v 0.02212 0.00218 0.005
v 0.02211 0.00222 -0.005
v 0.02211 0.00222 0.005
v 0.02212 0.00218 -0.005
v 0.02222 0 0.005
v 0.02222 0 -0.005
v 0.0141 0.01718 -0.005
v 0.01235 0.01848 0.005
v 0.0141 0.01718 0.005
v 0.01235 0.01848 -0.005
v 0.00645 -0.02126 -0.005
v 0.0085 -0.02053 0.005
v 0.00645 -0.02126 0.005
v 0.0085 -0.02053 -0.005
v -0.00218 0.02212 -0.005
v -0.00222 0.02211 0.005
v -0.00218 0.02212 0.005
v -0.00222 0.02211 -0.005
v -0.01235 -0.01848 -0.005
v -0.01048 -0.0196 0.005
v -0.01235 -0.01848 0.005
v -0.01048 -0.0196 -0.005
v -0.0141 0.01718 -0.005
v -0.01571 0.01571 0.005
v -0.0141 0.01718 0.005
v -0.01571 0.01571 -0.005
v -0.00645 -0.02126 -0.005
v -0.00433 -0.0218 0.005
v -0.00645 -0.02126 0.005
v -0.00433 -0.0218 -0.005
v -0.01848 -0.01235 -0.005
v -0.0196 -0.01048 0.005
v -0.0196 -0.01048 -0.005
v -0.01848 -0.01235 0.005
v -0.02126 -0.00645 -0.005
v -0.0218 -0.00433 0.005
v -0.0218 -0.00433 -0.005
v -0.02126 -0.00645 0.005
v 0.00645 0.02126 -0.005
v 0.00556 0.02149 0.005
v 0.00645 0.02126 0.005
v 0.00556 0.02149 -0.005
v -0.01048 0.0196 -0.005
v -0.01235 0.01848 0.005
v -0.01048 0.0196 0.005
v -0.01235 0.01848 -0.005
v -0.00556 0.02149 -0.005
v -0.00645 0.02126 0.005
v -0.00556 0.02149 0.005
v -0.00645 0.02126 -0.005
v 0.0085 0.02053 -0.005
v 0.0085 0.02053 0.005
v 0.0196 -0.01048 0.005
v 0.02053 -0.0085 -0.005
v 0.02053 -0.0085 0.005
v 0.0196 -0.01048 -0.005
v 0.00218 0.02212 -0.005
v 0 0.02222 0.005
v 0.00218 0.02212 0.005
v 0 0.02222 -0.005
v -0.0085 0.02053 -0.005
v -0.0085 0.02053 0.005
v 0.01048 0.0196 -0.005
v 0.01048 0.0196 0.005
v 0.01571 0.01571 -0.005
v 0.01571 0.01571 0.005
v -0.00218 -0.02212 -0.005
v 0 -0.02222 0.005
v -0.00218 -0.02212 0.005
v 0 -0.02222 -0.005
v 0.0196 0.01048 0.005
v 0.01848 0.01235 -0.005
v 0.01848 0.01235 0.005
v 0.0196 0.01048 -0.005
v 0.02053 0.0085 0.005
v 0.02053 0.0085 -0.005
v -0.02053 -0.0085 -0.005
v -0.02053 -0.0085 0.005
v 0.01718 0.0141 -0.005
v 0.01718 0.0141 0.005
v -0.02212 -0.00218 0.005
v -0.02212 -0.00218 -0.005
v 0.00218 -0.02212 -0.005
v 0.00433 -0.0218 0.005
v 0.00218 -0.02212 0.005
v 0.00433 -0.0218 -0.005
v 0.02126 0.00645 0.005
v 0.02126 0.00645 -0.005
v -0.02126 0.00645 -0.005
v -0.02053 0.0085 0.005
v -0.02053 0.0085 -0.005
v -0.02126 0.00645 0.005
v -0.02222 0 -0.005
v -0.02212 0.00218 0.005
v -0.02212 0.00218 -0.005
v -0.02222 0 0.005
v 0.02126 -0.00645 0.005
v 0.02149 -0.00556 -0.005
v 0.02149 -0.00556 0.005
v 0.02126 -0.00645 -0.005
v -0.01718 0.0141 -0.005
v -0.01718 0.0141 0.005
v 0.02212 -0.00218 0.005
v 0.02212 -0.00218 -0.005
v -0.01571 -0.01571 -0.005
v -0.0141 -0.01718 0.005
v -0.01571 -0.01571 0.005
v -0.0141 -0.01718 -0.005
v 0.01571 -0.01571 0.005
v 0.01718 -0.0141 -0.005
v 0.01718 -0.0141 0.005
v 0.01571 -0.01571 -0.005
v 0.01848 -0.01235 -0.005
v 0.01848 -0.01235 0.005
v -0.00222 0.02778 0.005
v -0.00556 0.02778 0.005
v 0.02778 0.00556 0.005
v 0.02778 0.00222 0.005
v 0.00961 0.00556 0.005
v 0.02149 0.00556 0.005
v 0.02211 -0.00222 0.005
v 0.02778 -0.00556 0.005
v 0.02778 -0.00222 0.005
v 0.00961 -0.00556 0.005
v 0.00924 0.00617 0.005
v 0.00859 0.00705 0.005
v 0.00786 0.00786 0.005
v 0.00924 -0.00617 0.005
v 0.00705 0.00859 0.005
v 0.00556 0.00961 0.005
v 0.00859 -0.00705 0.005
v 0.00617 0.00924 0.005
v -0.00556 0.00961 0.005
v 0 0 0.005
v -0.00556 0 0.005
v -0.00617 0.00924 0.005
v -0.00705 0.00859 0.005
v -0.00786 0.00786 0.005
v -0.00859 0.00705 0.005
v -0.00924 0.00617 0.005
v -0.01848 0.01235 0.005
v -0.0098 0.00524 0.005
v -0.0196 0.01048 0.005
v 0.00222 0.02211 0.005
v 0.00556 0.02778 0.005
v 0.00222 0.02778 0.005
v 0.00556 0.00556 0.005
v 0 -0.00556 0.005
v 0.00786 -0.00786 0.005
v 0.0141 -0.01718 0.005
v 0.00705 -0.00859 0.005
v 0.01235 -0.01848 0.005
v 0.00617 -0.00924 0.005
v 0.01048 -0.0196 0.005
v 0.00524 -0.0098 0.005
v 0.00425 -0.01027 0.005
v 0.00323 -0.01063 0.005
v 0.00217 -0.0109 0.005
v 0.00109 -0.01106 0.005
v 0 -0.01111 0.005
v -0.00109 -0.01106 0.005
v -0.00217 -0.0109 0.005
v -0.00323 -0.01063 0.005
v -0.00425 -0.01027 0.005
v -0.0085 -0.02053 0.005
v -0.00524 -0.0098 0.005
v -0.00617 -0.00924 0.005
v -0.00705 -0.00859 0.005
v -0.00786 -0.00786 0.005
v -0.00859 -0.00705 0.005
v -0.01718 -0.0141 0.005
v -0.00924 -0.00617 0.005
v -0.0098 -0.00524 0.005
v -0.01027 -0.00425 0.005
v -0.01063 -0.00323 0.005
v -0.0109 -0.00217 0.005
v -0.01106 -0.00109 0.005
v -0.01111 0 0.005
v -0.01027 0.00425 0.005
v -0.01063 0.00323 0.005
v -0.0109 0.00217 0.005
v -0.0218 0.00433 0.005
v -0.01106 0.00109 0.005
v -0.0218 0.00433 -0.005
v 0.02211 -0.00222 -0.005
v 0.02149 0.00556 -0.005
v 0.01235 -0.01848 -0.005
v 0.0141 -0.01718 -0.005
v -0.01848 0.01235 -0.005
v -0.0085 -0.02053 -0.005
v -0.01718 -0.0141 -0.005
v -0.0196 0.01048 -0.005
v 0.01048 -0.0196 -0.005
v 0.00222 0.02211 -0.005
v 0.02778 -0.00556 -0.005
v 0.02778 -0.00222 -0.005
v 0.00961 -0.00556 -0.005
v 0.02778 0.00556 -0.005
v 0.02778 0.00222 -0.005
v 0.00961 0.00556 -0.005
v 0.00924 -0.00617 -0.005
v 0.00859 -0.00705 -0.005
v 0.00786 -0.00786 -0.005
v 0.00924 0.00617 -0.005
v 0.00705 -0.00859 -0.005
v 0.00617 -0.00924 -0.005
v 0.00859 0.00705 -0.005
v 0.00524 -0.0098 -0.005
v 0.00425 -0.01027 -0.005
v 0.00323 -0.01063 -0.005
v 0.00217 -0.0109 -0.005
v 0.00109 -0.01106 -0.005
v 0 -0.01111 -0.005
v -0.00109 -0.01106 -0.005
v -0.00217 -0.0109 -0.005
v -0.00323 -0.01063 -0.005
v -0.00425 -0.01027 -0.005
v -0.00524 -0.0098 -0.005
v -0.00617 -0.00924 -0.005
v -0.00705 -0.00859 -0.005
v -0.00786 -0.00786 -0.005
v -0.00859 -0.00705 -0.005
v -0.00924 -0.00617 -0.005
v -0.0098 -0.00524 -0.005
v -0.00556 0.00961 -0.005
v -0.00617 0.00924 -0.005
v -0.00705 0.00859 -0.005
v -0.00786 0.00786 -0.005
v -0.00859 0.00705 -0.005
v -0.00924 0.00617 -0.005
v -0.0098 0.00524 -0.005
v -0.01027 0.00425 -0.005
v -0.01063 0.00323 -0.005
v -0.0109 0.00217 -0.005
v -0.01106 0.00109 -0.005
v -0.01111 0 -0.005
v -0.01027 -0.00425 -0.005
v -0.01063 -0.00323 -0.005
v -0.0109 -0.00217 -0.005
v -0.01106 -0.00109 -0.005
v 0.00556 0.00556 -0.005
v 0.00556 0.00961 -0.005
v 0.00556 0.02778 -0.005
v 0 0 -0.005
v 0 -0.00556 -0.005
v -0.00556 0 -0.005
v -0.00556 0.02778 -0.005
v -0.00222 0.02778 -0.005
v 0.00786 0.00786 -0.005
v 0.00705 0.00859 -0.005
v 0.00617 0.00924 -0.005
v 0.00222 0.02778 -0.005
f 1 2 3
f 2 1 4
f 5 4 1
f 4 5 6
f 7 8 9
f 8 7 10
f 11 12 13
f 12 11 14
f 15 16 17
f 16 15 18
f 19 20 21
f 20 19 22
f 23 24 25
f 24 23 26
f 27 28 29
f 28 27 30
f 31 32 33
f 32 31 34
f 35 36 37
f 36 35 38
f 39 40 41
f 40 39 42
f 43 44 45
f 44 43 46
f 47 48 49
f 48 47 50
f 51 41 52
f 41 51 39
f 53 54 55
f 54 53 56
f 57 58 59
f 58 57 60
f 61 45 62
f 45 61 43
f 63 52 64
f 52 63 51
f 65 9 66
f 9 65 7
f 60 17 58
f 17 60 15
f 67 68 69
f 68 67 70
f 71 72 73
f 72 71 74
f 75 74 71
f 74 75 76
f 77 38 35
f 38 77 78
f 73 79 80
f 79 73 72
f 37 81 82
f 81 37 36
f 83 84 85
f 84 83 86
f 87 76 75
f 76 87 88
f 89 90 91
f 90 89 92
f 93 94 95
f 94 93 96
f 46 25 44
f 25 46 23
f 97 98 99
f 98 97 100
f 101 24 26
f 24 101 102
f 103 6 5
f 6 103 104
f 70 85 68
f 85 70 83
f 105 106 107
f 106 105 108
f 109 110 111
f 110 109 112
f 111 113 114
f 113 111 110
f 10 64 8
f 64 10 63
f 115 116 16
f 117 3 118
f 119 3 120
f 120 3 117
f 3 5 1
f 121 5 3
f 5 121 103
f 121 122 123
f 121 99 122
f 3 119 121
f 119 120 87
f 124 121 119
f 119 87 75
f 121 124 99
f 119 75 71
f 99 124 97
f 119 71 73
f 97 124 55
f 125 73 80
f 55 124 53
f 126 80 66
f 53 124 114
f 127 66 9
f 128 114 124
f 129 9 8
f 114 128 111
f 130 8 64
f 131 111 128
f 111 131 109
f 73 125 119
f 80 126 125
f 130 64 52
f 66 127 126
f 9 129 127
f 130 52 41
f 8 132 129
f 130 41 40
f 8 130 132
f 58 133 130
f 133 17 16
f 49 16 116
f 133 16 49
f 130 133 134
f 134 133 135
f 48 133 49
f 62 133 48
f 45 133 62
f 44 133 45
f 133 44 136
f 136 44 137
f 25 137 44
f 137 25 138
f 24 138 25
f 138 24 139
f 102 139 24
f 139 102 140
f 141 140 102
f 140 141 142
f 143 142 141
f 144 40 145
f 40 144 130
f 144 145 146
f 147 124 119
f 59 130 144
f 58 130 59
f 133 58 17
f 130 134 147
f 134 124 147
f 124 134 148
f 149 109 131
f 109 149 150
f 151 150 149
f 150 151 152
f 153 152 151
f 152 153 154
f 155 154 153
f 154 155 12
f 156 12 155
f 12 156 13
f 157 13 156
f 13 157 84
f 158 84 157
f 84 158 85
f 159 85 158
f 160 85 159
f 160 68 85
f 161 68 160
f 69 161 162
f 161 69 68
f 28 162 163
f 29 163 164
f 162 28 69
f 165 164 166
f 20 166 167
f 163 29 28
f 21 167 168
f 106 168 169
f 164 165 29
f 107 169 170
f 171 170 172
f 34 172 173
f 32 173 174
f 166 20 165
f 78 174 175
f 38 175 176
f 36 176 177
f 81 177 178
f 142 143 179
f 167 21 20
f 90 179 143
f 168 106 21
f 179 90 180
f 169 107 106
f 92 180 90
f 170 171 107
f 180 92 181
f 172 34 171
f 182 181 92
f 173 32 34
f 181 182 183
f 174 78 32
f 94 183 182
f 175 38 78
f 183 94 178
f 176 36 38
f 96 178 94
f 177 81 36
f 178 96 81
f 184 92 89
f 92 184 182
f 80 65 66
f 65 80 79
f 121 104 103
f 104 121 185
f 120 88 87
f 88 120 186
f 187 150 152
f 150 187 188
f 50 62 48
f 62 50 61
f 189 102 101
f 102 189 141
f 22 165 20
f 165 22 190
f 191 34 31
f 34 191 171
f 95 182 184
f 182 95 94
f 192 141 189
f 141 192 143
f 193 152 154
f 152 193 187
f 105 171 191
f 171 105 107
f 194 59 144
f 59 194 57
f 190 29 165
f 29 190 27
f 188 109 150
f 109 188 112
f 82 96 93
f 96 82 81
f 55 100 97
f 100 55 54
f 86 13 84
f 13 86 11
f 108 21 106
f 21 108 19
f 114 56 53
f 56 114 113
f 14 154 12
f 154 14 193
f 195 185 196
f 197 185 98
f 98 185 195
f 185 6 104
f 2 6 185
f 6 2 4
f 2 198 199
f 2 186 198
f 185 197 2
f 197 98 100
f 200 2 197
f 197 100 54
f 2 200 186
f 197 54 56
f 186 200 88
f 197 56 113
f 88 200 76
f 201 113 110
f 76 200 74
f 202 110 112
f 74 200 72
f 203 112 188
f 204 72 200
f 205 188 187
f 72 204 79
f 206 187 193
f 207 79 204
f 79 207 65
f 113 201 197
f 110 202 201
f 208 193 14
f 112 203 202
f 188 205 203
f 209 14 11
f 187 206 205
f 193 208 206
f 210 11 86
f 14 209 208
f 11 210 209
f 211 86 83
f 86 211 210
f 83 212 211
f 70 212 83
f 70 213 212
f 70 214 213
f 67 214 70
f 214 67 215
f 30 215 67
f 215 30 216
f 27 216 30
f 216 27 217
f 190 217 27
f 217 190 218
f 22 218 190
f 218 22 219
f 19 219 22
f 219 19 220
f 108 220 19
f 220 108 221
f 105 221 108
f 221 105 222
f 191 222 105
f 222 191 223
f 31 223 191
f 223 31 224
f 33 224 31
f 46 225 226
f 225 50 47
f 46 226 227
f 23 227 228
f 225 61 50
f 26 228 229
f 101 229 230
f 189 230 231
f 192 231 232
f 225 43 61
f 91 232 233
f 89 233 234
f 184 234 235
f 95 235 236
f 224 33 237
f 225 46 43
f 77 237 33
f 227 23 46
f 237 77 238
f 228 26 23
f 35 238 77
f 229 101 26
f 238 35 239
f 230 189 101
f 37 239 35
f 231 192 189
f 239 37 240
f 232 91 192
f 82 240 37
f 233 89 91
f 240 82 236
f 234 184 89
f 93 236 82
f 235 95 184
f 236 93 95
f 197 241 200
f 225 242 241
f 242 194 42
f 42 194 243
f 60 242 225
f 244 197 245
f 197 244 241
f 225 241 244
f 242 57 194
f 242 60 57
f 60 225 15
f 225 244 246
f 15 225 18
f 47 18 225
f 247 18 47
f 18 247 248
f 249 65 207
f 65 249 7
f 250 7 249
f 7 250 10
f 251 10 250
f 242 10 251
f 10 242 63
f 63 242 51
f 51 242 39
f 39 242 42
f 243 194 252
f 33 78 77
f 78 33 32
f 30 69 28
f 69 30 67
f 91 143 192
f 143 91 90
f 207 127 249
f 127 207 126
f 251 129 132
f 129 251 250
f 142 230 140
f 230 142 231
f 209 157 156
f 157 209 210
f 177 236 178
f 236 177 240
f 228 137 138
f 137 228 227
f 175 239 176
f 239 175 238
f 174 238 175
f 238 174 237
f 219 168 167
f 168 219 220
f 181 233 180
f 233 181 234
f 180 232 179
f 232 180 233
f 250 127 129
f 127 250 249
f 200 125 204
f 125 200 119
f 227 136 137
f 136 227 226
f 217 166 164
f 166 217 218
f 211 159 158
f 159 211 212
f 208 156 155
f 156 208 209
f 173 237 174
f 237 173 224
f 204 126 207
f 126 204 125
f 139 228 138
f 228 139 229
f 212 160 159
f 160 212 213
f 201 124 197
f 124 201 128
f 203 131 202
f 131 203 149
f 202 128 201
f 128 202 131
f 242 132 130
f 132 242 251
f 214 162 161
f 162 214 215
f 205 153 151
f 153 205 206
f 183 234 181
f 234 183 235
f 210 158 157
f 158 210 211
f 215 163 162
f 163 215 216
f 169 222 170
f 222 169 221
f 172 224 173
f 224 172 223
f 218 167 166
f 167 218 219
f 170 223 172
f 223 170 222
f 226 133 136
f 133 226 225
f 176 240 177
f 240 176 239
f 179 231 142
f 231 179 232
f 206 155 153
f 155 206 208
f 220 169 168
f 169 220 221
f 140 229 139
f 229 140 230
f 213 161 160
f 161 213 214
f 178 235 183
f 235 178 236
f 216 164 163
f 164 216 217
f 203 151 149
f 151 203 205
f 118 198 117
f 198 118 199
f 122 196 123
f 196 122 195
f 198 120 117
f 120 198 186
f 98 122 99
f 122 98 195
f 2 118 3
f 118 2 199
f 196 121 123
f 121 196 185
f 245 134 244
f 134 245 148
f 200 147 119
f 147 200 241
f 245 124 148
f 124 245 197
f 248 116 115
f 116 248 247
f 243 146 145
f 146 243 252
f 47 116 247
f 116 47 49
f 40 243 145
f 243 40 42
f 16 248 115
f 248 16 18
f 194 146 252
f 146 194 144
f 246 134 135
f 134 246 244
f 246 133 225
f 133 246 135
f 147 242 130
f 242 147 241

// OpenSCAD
$fn=64;

bbox_x = 0.1;
bbox_y = 0.1;
bbox_z = 0.01;

ring_od = 0.08;
ring_id = 0.04;
plate_t = bbox_z;

arm_len = 0.03;
arm_w  = 0.02;

clevis_len = 0.02;
clevis_w   = 0.02;
prong_w    = 0.006;
gap_w      = clevis_w - 2*prong_w;
u_depth    = 0.012;

module annulus(od, id, t){
    difference(){
        cylinder(d=od, h=t, center=true);
        cylinder(d=id, h=t+0.02, center=true);
    }
}

module arm_plate(len, w, t){
    translate([len/2,0,0]) cube([len,w,t], center=true);
}

module clevis_u_end(len, w, t, prong, udepth){
    difference(){
        translate([len/2,0,0]) cube([len,w,t], center=true);
        translate([len-udepth/2,0,0]) cube([udepth, w-2*prong, t+0.02], center=true);
    }
}

module horizontal_clevis(){
    union(){
        arm_plate(arm_len, arm_w, plate_t);
        translate([arm_len,0,0]) clevis_u_end(clevis_len, clevis_w, plate_t, prong_w, u_depth);
    }
}

module vertical_clevis(){
    rotate([0,0,90]) horizontal_clevis();
}

scale_factor = min(bbox_x/(ring_od + 2*(arm_len+clevis_len)), bbox_y/(ring_od + 2*(arm_len+clevis_len)));

scale([scale_factor, scale_factor, 1])
union(){
    annulus(ring_od, ring_id, plate_t);
    horizontal_clevis();
    vertical_clevis();
}
